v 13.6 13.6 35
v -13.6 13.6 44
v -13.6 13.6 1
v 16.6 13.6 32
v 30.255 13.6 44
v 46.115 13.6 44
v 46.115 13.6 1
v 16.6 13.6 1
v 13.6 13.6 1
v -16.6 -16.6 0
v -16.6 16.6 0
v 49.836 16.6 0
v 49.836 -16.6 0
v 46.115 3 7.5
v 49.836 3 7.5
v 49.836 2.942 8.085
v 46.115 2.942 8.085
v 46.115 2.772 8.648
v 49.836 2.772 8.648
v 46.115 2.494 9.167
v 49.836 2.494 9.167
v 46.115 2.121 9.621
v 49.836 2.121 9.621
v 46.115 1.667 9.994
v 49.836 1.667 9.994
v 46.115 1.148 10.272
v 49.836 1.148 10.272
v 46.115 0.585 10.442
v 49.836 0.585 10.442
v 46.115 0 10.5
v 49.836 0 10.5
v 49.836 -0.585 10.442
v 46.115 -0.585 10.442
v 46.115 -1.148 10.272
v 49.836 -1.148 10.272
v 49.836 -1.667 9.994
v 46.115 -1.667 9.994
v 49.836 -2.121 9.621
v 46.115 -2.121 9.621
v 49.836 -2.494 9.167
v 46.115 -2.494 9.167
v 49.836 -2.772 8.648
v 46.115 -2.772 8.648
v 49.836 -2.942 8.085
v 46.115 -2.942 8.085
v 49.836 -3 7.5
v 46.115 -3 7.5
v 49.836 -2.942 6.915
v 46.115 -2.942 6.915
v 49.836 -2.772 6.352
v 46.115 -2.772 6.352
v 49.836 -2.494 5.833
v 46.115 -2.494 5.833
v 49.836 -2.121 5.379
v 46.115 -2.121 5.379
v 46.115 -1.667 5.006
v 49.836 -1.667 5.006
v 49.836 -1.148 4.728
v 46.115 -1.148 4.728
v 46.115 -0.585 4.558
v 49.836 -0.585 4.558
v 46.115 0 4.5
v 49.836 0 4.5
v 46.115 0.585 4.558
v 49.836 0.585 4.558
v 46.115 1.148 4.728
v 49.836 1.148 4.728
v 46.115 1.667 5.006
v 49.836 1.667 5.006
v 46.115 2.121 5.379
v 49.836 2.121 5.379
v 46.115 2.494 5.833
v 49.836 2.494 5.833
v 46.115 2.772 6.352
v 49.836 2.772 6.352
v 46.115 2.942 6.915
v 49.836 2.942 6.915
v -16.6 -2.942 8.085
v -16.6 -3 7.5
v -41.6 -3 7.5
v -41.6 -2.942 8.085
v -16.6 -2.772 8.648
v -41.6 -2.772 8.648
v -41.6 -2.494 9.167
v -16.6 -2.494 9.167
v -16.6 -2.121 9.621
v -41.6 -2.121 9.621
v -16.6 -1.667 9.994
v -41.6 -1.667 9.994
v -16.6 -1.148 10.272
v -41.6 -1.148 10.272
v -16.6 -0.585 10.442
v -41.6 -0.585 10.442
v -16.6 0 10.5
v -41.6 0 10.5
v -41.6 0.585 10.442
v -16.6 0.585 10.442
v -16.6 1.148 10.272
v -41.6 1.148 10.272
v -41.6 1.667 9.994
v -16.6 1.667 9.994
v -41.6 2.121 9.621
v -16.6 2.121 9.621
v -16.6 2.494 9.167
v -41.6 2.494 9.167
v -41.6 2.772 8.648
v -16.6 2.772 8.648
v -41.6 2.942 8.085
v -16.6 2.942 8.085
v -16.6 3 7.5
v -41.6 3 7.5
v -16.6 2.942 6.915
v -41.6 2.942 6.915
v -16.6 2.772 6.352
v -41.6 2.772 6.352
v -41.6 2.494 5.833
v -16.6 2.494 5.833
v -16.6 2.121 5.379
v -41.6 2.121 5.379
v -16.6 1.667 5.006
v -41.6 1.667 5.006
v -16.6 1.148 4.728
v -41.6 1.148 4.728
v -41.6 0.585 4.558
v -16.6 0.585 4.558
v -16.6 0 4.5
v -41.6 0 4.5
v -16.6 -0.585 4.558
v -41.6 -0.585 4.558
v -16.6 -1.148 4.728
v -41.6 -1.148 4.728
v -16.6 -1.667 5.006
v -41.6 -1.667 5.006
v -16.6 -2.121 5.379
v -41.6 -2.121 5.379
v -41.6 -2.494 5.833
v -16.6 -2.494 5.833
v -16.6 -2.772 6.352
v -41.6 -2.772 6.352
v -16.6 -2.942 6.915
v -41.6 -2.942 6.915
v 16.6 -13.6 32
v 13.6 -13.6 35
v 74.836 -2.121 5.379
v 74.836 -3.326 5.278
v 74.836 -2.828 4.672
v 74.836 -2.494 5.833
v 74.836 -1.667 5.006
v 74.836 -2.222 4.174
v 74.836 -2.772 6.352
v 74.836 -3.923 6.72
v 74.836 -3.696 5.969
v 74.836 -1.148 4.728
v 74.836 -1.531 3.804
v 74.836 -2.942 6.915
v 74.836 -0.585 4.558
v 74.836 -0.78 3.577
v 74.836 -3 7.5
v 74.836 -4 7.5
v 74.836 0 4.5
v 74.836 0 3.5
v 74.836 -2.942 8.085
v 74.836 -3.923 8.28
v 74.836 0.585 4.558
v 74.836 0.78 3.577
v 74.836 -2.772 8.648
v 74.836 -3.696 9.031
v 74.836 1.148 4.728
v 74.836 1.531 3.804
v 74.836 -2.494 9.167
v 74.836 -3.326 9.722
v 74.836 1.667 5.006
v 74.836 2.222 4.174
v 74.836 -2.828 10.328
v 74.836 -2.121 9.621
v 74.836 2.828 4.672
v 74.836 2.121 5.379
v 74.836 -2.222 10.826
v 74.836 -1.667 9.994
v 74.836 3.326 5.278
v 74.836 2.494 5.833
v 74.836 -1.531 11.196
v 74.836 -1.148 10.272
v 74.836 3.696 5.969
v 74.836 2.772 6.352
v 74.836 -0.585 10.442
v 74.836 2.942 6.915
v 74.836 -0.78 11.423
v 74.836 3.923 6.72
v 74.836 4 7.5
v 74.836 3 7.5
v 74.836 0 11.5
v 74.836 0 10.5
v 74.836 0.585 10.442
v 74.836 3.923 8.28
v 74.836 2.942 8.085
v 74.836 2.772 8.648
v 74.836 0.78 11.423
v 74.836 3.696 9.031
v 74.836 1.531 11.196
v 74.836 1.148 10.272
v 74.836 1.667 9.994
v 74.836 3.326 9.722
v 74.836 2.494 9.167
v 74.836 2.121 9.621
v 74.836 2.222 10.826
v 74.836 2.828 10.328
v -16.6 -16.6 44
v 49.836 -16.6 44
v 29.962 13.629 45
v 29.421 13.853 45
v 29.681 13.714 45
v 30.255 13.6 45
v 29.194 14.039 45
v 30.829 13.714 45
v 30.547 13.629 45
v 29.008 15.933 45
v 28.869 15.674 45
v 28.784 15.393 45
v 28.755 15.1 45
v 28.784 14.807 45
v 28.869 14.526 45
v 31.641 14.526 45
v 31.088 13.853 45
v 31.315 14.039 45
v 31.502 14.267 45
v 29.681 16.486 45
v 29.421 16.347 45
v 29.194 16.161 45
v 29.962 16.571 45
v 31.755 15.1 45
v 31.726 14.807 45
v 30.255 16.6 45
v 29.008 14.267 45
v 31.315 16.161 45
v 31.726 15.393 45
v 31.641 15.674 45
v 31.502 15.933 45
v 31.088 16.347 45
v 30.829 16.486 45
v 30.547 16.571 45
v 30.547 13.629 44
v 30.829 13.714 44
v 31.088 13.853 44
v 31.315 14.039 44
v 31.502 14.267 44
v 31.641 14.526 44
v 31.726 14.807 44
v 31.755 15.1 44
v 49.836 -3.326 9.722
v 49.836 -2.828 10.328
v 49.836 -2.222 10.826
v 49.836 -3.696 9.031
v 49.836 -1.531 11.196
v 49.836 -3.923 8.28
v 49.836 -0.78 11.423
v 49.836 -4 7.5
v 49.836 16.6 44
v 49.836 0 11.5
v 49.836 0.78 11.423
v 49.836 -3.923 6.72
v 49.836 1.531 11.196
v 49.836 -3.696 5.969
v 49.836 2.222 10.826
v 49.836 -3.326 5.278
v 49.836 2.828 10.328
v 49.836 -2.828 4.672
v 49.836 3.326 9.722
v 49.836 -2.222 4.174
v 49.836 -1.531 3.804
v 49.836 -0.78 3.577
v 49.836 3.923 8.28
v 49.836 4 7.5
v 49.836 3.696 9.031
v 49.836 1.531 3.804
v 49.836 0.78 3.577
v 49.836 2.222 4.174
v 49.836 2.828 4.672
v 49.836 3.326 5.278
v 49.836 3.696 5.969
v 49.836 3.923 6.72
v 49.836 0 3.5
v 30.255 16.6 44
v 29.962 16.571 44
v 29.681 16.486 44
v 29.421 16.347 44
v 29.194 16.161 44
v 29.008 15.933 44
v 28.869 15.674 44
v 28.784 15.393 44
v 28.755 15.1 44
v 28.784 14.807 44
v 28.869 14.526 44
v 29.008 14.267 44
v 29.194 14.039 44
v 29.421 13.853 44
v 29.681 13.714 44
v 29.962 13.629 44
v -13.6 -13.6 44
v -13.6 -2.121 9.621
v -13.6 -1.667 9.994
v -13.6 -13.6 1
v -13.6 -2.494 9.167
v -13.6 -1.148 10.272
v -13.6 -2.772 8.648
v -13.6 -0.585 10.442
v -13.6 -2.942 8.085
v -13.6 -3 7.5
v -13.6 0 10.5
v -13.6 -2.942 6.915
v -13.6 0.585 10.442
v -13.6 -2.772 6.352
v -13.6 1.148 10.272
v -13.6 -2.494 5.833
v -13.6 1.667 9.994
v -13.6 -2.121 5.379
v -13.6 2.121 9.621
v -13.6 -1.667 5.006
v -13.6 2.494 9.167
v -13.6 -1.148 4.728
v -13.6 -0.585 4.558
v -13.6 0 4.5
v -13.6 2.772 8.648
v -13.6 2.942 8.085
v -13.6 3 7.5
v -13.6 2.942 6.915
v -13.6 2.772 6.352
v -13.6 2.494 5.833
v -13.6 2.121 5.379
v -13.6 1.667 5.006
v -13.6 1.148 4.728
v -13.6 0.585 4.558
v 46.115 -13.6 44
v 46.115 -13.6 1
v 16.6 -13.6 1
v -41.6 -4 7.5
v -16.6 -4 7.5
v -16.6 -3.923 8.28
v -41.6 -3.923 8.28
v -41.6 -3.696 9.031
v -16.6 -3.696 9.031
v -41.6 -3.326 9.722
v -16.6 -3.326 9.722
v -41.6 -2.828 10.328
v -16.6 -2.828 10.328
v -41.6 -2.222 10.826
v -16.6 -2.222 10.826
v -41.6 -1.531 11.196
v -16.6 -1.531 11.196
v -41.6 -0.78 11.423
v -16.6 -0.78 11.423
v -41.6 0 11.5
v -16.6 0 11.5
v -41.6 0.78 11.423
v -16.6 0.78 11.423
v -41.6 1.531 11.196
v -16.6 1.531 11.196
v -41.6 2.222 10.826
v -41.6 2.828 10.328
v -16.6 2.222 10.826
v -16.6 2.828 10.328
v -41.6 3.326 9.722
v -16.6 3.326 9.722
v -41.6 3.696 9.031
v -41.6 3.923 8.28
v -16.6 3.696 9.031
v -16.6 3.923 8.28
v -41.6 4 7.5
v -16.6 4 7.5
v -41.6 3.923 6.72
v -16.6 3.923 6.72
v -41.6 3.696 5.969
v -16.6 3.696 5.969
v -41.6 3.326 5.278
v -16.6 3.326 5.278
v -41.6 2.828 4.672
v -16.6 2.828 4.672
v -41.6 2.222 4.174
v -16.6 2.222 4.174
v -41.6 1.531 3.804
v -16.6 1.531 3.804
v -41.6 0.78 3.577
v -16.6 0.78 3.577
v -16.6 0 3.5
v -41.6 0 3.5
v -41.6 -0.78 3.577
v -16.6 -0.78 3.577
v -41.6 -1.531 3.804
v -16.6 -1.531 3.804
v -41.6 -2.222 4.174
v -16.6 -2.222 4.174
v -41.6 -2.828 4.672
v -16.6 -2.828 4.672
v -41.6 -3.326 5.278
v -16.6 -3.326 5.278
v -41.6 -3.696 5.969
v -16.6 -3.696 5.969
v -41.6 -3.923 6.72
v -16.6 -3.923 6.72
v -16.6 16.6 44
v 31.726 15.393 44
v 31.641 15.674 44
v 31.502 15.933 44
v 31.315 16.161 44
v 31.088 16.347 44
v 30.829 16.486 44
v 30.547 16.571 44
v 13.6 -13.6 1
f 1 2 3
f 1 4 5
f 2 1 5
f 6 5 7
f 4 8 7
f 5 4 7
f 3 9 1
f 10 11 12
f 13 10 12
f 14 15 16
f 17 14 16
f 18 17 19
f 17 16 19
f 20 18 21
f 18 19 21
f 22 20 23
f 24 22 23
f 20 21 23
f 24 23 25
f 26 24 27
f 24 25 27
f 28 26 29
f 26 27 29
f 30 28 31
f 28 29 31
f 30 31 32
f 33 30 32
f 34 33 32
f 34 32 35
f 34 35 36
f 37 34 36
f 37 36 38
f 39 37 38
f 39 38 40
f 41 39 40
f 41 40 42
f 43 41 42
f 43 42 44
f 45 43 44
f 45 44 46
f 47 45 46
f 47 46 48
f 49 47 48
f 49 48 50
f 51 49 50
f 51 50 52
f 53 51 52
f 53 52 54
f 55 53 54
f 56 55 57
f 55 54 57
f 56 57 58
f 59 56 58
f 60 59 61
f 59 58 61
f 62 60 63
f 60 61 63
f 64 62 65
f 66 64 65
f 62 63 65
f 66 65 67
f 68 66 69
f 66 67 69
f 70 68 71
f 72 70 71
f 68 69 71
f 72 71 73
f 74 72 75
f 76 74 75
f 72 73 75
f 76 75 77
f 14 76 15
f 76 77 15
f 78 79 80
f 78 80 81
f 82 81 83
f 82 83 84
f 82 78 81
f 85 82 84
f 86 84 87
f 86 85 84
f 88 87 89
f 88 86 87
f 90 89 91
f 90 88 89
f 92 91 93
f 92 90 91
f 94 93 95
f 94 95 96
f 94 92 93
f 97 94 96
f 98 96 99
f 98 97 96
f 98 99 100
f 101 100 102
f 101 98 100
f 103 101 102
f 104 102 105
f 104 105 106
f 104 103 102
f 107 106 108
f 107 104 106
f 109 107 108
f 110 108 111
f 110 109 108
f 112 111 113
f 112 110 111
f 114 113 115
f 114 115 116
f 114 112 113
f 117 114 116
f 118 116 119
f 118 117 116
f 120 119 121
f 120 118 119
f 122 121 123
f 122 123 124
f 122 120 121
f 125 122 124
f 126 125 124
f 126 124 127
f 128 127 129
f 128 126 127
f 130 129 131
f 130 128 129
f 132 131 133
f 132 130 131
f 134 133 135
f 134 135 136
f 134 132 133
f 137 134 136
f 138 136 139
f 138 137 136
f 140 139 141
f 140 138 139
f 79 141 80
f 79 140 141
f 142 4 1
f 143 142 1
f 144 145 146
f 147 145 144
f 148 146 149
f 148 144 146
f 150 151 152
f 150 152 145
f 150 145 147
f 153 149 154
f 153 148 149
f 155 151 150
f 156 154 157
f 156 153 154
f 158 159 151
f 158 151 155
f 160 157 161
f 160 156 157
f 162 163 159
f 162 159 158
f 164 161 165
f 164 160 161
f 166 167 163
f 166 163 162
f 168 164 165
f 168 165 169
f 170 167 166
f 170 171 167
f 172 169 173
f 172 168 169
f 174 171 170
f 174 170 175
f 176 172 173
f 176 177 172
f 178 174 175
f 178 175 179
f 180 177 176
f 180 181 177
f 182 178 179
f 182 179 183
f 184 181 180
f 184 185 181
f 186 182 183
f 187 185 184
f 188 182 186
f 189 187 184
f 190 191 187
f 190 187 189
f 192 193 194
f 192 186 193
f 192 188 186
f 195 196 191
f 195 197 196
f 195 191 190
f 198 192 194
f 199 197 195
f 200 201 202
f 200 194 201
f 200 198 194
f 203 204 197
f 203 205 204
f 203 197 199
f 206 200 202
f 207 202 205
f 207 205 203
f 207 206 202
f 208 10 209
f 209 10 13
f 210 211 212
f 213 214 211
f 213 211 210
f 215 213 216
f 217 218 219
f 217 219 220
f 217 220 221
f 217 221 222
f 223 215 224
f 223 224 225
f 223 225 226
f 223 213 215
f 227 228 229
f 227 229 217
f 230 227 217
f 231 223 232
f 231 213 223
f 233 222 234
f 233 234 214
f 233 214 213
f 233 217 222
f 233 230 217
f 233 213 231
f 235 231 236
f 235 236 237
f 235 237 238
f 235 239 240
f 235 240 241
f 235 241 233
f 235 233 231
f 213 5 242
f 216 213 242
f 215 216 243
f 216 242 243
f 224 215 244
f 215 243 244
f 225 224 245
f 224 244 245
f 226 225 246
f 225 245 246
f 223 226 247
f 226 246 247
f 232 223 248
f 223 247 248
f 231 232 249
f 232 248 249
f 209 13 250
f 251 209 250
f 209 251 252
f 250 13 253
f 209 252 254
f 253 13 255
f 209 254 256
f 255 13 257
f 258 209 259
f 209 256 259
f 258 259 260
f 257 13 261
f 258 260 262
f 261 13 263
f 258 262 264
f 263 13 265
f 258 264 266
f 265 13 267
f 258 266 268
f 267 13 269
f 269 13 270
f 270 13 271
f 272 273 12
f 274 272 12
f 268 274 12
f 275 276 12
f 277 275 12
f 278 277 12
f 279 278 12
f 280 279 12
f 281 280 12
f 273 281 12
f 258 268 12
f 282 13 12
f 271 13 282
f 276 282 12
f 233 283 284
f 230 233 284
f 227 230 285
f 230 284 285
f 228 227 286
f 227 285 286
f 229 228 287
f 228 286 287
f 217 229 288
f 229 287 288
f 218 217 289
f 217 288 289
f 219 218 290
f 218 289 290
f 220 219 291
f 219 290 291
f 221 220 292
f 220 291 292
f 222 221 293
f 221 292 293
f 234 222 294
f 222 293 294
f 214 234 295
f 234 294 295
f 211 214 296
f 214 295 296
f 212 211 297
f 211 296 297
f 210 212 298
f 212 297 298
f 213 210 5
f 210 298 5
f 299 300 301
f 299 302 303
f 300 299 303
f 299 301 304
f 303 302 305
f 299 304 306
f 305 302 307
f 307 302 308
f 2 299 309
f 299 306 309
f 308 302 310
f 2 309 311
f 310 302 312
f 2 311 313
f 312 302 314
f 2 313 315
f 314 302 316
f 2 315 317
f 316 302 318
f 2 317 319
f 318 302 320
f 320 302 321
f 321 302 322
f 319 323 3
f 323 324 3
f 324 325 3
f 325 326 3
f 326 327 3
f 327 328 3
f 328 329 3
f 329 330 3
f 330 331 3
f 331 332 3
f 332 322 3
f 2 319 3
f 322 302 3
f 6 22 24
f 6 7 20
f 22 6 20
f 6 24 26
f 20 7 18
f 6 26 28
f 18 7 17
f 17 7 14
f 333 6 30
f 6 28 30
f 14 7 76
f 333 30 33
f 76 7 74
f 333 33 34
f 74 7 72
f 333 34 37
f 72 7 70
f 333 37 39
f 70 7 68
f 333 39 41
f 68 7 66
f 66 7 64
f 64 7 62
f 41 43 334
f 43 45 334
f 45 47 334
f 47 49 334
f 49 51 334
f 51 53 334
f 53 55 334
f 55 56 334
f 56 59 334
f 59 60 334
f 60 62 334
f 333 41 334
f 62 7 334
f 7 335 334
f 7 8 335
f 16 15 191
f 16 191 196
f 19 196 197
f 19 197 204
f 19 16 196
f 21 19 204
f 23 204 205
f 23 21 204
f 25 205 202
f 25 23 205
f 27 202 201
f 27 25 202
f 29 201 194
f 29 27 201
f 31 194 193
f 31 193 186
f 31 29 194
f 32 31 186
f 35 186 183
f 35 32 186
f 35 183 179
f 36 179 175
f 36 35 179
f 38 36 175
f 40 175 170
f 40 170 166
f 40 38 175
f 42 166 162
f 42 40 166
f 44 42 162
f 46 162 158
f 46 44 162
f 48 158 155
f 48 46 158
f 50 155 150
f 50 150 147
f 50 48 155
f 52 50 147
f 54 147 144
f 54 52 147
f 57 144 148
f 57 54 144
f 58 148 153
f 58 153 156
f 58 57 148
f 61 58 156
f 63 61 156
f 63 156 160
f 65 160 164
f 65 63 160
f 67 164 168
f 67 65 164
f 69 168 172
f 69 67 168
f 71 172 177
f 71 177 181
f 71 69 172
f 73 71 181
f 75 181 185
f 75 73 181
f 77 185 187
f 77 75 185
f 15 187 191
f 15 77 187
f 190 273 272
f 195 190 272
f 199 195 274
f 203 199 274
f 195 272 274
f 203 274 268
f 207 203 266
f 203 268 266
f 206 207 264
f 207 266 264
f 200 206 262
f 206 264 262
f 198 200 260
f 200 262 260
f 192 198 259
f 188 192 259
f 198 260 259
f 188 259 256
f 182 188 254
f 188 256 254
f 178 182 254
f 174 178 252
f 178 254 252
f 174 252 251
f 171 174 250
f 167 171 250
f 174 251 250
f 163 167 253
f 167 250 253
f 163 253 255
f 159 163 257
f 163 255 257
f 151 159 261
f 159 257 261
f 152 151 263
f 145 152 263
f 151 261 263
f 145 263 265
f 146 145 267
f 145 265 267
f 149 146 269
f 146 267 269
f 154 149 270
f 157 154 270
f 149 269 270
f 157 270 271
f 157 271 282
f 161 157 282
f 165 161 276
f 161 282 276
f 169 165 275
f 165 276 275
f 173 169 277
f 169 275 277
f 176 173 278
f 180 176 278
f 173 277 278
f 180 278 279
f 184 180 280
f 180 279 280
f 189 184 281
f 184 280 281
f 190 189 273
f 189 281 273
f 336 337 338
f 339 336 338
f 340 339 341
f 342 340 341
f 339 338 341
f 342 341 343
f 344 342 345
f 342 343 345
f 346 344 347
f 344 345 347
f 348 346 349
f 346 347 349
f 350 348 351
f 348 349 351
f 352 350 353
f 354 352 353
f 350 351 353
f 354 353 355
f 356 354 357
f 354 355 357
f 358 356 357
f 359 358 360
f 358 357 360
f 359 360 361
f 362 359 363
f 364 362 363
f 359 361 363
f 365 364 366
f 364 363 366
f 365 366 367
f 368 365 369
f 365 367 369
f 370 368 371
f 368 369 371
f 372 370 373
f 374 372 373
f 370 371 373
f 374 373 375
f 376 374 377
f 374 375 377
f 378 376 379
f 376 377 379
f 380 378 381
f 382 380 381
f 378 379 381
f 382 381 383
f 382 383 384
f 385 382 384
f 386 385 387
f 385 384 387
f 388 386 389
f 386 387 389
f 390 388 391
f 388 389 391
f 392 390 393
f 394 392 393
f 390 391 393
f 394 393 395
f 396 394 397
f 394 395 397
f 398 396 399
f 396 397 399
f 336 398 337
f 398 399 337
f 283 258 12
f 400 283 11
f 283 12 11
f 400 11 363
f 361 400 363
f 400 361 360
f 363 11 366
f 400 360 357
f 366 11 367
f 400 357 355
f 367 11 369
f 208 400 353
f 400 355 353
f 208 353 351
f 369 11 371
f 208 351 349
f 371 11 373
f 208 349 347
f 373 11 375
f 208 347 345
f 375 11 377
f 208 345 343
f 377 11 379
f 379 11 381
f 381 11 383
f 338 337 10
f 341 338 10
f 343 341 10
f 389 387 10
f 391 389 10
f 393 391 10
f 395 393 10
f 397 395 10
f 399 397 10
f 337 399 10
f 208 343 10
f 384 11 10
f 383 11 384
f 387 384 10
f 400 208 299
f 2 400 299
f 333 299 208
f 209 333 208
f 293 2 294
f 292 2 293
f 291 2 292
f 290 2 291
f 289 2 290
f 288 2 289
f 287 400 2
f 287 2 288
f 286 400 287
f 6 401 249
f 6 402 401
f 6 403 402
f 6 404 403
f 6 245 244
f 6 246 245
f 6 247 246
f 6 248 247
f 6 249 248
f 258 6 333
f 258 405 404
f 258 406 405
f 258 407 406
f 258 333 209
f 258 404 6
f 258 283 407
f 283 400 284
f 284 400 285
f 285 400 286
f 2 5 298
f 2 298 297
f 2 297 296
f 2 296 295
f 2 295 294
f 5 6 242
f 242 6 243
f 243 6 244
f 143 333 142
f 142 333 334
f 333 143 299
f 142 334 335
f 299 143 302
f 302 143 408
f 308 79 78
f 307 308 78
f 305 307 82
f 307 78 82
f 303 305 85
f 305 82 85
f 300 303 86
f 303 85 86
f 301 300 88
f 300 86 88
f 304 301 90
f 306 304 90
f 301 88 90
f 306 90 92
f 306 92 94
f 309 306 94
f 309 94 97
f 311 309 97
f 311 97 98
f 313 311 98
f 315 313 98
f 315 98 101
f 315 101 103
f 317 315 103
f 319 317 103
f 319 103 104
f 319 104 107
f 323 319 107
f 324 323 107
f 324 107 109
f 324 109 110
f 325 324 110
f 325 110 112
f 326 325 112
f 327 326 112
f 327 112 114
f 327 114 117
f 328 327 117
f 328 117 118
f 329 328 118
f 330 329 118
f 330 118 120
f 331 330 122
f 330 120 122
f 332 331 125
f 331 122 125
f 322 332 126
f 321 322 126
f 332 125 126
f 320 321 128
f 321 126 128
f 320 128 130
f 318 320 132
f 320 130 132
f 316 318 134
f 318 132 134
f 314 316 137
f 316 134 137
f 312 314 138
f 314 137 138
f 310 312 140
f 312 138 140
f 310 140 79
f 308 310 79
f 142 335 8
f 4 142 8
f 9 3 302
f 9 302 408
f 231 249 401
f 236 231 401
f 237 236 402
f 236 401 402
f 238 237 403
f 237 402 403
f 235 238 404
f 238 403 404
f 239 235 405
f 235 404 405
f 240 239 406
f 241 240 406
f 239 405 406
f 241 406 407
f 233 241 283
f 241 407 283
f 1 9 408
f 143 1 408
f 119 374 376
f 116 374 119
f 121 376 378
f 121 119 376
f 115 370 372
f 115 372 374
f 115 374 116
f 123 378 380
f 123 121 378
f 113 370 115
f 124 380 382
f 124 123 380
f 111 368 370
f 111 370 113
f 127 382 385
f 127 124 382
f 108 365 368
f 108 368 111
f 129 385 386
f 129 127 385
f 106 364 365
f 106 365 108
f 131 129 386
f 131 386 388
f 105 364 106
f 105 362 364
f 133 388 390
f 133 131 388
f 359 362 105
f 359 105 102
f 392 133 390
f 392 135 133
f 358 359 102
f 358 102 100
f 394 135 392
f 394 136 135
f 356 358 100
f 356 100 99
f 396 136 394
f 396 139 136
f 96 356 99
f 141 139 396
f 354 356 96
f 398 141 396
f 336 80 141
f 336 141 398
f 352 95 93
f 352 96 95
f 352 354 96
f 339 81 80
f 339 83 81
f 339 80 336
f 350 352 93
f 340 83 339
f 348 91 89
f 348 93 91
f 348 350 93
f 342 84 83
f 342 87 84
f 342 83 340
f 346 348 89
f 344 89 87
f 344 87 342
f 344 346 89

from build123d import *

# Parameters (mm, degrees)
F1_DEPTH     = 44
F0_W         = 27.2
F0_H         = 27.2
F2_DEPTH     = 1
F3_DEPTH     = 37
F4_R         = 4
F4_R_2       = 3
F5_DEPTH     = 25
F6_DEPTH     = 5
F7_R         = 4
F7_R_2       = 3
F8_DEPTH     = 25
F9_DEPTH     = 5
F10_T1_DEPTH = 27.2
F12_DEPTH    = 1


# Not quite as in the source:
# - a fillet or chamfer that OpenCascade refuses, or shapes differently, is made with other operations: its cross-section is extruded or revolved along the edge and cut away or added


with BuildPart() as f1:
    # F0 (on Top) → F1 (new body)
    with BuildSketch(Plane.XY):
        Polygon((49.8359054327, 16.6), (16.6, 16.6), (-16.6, 16.6), (-16.6, 3), (-16.6, 2), (-16.6, -2), (-16.6, -3), (-16.6, -16.6), (16.6, -16.6), (49.8359054327, -16.6), (49.8359054327, -3), (49.8359054327, -2), (49.8359054327, 2), (49.8359054327, 3), align=None)
        Polygon((16.6, -13.6), (13.6, -13.6), (-13.6, -13.6), (-13.6, 13.6), (13.6, 13.6), (16.6, 13.6), (46.1153909564, 13.6), (46.1153909564, -13.6), align=None, mode=Mode.SUBTRACT)
    extrude(amount=F1_DEPTH)

    # F0 (on Top) → F2 (join)
    with BuildSketch(Plane.XY):
        Rectangle(F0_W, F0_H)
        Polygon((16.6, -3), (16.6, -13.6), (46.1153909564, -13.6), (46.1153909564, 13.6), (16.6, 13.6), (16.6, 3), align=None)
    extrude(amount=F2_DEPTH)

    # F0 (on Top) → F3 (join)
    with BuildSketch(Plane.XY):
        Polygon((13.6, 13.6), (13.6, -13.6), (16.6, -13.6), (16.6, -3), (16.6, 3), (16.6, 13.6), align=None)
    extrude(amount=F3_DEPTH)

    # F4 (on face) → F5 (join)
    with BuildSketch(Plane(origin=(-16.6, 0, 0), x_dir=(0, -1, 0), z_dir=(-1, 0, 0))):
        with Locations((0, 7.5)):
            Circle(F4_R)
        with Locations((0, 7.5)):
            Circle(F4_R_2, mode=Mode.SUBTRACT)
    extrude(amount=F5_DEPTH)

    # F6 (cut): a face of the model
    f6_faces = [f1.faces().sort_by_distance(p)[0] for p in [
        (-16.6, 0, 7.5),
    ]]
    extrude(f6_faces, amount=-F6_DEPTH, mode=Mode.SUBTRACT)

    # F7 (on face) → F8 (join)
    with BuildSketch(Plane.YZ.offset(49.8359054327)):
        with Locations((0, 7.5)):
            Circle(F7_R)
        with Locations((0, 7.5)):
            Circle(F7_R_2, mode=Mode.SUBTRACT)
    extrude(amount=F8_DEPTH)

    # F9 (cut): a face of the model
    f9_faces = [f1.faces().sort_by_distance(p)[0] for p in [
        (49.8359054327, 0, 7.5),
    ]]
    extrude(f9_faces, amount=-F9_DEPTH, mode=Mode.SUBTRACT)

    # F10: chamfer of 5 on 1 edges, made by hand

    # F10_s2 → F10_t1 (cut)
    with BuildSketch(Plane.XZ.offset(-13.6)):
        Polygon((16.6, 32), (11.6, 37), (16.6, 37), align=None)
    extrude(amount=F10_T1_DEPTH, mode=Mode.SUBTRACT)

    # F11 (on face) → F12 (join)
    with BuildSketch(Plane.XY.offset(44)):
        with BuildLine():
            ThreePointArc((30.2547216209, 13.6), (31.315381806, 14.0393398209), (31.7547216415, 15.1))
            ThreePointArc((31.7547216415, 15.1), (31.3153818133, 16.1606601718), (30.2547216415, 16.6))
            ThreePointArc((30.2547216415, 16.6), (28.7547216415, 15.1000000103), (30.2547216209, 13.6))
        make_face()
    extrude(amount=F12_DEPTH)


solid = f1.part
